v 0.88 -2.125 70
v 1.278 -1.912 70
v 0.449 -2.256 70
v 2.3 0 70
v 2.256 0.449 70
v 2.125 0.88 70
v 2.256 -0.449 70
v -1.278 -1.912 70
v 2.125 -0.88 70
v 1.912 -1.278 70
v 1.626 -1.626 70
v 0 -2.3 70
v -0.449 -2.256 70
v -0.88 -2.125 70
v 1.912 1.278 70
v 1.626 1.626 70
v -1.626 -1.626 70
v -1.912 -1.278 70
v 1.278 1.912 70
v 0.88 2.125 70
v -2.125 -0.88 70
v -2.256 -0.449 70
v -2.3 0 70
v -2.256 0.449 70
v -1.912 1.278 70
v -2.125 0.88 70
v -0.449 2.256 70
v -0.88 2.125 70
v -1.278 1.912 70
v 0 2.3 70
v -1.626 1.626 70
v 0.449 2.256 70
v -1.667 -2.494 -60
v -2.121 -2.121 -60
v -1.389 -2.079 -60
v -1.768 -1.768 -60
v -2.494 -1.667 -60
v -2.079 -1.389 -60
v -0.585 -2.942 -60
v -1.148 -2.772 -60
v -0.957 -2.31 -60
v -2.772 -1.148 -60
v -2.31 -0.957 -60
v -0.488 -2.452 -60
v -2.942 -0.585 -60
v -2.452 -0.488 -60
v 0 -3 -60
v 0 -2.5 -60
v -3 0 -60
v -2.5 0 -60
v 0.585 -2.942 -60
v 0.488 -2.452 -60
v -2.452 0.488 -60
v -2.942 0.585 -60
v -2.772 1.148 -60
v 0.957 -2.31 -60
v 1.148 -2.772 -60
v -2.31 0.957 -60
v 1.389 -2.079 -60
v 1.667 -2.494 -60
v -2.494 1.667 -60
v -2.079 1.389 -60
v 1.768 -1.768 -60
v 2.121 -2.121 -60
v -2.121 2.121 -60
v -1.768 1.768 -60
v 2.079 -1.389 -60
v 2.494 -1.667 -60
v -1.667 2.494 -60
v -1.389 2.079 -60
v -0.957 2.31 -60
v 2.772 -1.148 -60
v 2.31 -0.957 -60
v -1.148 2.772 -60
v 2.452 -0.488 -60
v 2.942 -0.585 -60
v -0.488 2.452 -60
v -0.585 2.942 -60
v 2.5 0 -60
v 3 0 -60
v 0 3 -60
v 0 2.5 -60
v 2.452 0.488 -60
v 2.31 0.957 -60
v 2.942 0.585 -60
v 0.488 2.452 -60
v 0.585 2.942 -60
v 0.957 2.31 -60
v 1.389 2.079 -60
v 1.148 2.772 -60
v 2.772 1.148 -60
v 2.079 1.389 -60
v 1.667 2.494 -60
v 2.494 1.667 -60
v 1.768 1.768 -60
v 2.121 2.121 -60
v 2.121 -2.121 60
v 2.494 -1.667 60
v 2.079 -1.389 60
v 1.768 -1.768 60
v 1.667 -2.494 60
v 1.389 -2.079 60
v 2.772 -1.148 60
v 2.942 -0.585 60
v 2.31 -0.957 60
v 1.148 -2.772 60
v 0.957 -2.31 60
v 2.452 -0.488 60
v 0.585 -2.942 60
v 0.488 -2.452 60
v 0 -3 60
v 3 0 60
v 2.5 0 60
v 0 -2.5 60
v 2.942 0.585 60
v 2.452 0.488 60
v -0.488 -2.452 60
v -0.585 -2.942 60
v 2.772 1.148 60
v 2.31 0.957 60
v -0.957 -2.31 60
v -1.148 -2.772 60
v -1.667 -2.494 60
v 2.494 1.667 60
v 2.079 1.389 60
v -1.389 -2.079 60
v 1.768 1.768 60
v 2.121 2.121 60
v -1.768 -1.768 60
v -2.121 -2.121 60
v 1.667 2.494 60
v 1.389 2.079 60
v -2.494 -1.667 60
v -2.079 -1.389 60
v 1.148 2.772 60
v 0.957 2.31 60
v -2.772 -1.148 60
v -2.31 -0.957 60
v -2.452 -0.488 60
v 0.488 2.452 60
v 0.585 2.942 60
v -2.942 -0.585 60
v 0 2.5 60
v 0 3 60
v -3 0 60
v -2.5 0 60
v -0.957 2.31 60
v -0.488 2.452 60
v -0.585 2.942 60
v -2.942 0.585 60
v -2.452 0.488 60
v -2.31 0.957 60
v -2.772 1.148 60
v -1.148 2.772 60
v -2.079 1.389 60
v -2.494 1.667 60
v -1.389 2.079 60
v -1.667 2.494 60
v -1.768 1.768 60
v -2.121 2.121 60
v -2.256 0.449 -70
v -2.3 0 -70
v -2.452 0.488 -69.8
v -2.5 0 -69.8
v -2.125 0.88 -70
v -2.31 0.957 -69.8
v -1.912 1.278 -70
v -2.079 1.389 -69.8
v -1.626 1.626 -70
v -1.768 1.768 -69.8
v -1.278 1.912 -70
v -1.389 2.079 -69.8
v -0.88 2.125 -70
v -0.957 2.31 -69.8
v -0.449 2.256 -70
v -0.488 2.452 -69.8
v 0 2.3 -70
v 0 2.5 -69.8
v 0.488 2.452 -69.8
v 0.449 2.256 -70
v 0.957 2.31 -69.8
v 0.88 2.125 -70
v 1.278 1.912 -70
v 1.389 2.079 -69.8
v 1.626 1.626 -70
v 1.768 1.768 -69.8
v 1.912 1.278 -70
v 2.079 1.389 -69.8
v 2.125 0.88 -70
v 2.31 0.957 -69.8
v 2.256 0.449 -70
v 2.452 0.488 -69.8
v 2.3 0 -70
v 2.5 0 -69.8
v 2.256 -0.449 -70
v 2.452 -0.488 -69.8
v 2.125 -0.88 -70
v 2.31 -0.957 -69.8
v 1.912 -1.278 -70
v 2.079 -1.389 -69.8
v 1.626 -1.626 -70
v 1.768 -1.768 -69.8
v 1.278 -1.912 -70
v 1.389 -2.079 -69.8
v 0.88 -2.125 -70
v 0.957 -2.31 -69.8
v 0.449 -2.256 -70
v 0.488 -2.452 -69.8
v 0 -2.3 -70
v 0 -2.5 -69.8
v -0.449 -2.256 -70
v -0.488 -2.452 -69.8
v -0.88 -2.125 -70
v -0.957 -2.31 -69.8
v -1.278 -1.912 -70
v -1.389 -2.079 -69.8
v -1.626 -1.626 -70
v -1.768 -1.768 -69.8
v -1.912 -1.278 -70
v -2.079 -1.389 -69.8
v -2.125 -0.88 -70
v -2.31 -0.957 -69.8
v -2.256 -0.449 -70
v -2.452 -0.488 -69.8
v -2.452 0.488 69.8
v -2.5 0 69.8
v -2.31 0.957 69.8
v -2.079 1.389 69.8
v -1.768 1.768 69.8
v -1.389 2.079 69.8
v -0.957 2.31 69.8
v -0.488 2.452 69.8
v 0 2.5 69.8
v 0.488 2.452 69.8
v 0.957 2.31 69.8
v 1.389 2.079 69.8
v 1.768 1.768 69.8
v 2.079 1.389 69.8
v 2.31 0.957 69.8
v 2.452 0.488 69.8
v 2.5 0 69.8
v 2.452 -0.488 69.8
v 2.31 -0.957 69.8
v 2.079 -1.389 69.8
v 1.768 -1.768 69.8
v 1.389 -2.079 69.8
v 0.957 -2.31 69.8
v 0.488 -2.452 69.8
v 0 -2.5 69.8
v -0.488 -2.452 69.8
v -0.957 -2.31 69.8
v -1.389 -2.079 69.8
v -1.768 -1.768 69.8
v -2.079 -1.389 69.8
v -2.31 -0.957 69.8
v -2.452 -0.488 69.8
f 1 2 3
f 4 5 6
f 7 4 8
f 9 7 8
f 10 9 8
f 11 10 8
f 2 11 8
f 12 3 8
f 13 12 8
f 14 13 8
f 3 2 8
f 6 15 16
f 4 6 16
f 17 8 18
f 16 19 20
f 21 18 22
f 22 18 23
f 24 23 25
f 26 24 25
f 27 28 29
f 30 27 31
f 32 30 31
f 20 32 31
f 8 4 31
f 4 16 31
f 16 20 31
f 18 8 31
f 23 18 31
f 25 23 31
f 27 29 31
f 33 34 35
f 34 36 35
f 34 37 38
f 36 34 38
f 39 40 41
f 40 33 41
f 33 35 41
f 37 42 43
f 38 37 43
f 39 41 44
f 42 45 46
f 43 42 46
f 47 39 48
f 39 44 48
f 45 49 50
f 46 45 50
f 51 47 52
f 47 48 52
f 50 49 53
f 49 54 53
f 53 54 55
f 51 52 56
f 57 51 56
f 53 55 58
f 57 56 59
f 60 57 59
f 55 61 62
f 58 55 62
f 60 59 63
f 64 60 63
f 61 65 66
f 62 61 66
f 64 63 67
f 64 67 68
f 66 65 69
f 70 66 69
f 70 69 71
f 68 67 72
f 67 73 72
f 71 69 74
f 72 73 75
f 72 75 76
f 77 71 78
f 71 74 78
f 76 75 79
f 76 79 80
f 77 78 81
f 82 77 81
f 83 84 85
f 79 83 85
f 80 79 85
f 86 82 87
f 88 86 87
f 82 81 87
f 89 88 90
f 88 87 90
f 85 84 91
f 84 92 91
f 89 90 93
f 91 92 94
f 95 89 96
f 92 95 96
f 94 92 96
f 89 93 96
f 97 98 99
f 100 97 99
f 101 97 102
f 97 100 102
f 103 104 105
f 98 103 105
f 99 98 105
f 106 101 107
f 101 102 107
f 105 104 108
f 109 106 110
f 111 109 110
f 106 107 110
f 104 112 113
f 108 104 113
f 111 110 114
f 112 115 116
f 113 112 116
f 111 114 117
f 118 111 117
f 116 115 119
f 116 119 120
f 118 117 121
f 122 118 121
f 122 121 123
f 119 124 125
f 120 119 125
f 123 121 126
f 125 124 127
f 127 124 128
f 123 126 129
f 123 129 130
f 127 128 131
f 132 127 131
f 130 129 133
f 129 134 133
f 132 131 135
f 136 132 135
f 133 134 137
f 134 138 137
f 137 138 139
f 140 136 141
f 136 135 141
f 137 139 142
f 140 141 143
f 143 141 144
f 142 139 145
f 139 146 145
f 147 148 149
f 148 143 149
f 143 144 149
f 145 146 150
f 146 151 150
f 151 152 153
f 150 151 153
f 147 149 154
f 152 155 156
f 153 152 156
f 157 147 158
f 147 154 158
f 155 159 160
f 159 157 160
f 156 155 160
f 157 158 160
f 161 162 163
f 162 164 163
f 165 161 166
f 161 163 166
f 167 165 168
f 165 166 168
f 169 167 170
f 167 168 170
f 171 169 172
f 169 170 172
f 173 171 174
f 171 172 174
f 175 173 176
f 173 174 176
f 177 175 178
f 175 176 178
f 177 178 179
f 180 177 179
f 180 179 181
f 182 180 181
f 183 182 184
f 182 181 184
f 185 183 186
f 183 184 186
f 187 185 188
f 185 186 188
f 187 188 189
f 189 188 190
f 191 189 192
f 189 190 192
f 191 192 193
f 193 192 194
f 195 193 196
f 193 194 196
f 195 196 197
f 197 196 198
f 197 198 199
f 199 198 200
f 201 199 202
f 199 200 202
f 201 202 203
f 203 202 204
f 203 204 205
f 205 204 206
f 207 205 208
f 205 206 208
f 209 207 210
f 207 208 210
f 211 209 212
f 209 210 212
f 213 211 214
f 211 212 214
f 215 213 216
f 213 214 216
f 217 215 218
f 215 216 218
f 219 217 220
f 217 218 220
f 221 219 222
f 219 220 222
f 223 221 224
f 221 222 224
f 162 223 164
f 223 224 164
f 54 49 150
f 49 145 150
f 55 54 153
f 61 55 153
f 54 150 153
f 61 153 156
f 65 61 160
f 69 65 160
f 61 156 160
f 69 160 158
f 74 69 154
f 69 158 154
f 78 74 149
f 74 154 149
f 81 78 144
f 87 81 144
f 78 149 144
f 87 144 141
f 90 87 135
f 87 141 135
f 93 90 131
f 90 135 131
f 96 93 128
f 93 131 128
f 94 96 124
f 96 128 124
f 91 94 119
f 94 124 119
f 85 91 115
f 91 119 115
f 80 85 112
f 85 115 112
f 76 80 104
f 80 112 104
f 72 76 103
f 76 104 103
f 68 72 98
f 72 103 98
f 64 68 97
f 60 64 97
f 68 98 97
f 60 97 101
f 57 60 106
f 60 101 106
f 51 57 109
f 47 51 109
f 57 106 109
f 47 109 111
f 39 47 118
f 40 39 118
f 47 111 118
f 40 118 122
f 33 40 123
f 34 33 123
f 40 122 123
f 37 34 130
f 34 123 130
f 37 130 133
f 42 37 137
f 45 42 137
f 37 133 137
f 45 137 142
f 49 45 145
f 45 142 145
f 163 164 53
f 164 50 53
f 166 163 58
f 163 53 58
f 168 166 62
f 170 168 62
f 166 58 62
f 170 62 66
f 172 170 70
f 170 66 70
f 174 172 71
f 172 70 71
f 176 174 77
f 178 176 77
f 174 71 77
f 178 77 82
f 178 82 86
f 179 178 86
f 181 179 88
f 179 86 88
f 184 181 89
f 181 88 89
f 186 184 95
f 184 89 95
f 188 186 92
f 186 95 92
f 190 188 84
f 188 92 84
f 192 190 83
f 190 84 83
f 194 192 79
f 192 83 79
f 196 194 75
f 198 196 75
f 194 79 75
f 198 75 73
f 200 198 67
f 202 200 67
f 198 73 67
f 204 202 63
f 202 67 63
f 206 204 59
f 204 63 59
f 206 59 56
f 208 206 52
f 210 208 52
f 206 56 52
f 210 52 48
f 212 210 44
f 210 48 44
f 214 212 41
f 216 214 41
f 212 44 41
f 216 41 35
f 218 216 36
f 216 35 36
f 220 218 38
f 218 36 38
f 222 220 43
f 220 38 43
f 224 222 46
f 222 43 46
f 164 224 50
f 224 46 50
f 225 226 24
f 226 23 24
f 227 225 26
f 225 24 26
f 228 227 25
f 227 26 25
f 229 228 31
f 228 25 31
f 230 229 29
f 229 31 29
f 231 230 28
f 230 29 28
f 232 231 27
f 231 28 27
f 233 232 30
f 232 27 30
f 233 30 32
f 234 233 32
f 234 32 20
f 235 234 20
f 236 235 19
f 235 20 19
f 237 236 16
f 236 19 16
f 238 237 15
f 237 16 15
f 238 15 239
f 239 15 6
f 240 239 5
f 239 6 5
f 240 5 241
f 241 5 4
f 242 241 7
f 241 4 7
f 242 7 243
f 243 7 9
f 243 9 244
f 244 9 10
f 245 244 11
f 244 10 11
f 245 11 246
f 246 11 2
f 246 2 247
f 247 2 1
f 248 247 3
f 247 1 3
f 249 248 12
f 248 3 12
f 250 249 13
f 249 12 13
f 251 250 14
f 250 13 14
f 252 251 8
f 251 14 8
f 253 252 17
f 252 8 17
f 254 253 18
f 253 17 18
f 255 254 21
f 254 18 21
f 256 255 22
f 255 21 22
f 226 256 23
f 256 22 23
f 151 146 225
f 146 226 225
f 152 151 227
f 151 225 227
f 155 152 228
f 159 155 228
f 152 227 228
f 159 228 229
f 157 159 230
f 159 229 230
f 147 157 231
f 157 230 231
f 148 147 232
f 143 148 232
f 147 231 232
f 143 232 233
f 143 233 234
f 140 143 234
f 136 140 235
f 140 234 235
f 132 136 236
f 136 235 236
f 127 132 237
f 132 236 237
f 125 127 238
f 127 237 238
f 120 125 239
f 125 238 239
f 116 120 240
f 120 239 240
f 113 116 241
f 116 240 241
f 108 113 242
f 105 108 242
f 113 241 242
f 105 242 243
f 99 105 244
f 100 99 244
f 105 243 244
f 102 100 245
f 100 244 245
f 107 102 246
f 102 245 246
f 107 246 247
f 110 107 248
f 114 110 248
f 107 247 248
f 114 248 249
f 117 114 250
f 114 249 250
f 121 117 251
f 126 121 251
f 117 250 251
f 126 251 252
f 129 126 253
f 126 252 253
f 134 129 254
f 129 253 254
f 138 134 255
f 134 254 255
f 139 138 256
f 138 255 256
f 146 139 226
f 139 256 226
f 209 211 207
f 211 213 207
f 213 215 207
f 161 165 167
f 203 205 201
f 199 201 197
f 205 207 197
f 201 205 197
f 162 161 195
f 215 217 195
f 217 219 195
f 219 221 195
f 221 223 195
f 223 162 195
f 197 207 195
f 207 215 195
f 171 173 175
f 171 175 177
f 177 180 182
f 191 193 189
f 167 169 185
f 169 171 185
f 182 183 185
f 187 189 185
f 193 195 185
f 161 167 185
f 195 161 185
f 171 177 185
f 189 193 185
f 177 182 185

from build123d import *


with BuildPart() as part:
    # Sketch1 → Revolve1 (revolve)
    with BuildSketch(Plane.XZ, mode=Mode.PRIVATE) as revolve1_sk:
        Polygon((2.3, 70), (0, 70), (0, -70), (2.3, -70), (2.5, -69.8), (2.5, -60), (3, -60), (3, 60), (2.5, 60), (2.5, 69.8), align=None)
    revolve(revolve1_sk.sketch.rotate(Axis((0, 0, 70), (0, 0, -1)), 180), axis=Axis((0, 0, 70), (0, 0, -1)))


solid = part.part
